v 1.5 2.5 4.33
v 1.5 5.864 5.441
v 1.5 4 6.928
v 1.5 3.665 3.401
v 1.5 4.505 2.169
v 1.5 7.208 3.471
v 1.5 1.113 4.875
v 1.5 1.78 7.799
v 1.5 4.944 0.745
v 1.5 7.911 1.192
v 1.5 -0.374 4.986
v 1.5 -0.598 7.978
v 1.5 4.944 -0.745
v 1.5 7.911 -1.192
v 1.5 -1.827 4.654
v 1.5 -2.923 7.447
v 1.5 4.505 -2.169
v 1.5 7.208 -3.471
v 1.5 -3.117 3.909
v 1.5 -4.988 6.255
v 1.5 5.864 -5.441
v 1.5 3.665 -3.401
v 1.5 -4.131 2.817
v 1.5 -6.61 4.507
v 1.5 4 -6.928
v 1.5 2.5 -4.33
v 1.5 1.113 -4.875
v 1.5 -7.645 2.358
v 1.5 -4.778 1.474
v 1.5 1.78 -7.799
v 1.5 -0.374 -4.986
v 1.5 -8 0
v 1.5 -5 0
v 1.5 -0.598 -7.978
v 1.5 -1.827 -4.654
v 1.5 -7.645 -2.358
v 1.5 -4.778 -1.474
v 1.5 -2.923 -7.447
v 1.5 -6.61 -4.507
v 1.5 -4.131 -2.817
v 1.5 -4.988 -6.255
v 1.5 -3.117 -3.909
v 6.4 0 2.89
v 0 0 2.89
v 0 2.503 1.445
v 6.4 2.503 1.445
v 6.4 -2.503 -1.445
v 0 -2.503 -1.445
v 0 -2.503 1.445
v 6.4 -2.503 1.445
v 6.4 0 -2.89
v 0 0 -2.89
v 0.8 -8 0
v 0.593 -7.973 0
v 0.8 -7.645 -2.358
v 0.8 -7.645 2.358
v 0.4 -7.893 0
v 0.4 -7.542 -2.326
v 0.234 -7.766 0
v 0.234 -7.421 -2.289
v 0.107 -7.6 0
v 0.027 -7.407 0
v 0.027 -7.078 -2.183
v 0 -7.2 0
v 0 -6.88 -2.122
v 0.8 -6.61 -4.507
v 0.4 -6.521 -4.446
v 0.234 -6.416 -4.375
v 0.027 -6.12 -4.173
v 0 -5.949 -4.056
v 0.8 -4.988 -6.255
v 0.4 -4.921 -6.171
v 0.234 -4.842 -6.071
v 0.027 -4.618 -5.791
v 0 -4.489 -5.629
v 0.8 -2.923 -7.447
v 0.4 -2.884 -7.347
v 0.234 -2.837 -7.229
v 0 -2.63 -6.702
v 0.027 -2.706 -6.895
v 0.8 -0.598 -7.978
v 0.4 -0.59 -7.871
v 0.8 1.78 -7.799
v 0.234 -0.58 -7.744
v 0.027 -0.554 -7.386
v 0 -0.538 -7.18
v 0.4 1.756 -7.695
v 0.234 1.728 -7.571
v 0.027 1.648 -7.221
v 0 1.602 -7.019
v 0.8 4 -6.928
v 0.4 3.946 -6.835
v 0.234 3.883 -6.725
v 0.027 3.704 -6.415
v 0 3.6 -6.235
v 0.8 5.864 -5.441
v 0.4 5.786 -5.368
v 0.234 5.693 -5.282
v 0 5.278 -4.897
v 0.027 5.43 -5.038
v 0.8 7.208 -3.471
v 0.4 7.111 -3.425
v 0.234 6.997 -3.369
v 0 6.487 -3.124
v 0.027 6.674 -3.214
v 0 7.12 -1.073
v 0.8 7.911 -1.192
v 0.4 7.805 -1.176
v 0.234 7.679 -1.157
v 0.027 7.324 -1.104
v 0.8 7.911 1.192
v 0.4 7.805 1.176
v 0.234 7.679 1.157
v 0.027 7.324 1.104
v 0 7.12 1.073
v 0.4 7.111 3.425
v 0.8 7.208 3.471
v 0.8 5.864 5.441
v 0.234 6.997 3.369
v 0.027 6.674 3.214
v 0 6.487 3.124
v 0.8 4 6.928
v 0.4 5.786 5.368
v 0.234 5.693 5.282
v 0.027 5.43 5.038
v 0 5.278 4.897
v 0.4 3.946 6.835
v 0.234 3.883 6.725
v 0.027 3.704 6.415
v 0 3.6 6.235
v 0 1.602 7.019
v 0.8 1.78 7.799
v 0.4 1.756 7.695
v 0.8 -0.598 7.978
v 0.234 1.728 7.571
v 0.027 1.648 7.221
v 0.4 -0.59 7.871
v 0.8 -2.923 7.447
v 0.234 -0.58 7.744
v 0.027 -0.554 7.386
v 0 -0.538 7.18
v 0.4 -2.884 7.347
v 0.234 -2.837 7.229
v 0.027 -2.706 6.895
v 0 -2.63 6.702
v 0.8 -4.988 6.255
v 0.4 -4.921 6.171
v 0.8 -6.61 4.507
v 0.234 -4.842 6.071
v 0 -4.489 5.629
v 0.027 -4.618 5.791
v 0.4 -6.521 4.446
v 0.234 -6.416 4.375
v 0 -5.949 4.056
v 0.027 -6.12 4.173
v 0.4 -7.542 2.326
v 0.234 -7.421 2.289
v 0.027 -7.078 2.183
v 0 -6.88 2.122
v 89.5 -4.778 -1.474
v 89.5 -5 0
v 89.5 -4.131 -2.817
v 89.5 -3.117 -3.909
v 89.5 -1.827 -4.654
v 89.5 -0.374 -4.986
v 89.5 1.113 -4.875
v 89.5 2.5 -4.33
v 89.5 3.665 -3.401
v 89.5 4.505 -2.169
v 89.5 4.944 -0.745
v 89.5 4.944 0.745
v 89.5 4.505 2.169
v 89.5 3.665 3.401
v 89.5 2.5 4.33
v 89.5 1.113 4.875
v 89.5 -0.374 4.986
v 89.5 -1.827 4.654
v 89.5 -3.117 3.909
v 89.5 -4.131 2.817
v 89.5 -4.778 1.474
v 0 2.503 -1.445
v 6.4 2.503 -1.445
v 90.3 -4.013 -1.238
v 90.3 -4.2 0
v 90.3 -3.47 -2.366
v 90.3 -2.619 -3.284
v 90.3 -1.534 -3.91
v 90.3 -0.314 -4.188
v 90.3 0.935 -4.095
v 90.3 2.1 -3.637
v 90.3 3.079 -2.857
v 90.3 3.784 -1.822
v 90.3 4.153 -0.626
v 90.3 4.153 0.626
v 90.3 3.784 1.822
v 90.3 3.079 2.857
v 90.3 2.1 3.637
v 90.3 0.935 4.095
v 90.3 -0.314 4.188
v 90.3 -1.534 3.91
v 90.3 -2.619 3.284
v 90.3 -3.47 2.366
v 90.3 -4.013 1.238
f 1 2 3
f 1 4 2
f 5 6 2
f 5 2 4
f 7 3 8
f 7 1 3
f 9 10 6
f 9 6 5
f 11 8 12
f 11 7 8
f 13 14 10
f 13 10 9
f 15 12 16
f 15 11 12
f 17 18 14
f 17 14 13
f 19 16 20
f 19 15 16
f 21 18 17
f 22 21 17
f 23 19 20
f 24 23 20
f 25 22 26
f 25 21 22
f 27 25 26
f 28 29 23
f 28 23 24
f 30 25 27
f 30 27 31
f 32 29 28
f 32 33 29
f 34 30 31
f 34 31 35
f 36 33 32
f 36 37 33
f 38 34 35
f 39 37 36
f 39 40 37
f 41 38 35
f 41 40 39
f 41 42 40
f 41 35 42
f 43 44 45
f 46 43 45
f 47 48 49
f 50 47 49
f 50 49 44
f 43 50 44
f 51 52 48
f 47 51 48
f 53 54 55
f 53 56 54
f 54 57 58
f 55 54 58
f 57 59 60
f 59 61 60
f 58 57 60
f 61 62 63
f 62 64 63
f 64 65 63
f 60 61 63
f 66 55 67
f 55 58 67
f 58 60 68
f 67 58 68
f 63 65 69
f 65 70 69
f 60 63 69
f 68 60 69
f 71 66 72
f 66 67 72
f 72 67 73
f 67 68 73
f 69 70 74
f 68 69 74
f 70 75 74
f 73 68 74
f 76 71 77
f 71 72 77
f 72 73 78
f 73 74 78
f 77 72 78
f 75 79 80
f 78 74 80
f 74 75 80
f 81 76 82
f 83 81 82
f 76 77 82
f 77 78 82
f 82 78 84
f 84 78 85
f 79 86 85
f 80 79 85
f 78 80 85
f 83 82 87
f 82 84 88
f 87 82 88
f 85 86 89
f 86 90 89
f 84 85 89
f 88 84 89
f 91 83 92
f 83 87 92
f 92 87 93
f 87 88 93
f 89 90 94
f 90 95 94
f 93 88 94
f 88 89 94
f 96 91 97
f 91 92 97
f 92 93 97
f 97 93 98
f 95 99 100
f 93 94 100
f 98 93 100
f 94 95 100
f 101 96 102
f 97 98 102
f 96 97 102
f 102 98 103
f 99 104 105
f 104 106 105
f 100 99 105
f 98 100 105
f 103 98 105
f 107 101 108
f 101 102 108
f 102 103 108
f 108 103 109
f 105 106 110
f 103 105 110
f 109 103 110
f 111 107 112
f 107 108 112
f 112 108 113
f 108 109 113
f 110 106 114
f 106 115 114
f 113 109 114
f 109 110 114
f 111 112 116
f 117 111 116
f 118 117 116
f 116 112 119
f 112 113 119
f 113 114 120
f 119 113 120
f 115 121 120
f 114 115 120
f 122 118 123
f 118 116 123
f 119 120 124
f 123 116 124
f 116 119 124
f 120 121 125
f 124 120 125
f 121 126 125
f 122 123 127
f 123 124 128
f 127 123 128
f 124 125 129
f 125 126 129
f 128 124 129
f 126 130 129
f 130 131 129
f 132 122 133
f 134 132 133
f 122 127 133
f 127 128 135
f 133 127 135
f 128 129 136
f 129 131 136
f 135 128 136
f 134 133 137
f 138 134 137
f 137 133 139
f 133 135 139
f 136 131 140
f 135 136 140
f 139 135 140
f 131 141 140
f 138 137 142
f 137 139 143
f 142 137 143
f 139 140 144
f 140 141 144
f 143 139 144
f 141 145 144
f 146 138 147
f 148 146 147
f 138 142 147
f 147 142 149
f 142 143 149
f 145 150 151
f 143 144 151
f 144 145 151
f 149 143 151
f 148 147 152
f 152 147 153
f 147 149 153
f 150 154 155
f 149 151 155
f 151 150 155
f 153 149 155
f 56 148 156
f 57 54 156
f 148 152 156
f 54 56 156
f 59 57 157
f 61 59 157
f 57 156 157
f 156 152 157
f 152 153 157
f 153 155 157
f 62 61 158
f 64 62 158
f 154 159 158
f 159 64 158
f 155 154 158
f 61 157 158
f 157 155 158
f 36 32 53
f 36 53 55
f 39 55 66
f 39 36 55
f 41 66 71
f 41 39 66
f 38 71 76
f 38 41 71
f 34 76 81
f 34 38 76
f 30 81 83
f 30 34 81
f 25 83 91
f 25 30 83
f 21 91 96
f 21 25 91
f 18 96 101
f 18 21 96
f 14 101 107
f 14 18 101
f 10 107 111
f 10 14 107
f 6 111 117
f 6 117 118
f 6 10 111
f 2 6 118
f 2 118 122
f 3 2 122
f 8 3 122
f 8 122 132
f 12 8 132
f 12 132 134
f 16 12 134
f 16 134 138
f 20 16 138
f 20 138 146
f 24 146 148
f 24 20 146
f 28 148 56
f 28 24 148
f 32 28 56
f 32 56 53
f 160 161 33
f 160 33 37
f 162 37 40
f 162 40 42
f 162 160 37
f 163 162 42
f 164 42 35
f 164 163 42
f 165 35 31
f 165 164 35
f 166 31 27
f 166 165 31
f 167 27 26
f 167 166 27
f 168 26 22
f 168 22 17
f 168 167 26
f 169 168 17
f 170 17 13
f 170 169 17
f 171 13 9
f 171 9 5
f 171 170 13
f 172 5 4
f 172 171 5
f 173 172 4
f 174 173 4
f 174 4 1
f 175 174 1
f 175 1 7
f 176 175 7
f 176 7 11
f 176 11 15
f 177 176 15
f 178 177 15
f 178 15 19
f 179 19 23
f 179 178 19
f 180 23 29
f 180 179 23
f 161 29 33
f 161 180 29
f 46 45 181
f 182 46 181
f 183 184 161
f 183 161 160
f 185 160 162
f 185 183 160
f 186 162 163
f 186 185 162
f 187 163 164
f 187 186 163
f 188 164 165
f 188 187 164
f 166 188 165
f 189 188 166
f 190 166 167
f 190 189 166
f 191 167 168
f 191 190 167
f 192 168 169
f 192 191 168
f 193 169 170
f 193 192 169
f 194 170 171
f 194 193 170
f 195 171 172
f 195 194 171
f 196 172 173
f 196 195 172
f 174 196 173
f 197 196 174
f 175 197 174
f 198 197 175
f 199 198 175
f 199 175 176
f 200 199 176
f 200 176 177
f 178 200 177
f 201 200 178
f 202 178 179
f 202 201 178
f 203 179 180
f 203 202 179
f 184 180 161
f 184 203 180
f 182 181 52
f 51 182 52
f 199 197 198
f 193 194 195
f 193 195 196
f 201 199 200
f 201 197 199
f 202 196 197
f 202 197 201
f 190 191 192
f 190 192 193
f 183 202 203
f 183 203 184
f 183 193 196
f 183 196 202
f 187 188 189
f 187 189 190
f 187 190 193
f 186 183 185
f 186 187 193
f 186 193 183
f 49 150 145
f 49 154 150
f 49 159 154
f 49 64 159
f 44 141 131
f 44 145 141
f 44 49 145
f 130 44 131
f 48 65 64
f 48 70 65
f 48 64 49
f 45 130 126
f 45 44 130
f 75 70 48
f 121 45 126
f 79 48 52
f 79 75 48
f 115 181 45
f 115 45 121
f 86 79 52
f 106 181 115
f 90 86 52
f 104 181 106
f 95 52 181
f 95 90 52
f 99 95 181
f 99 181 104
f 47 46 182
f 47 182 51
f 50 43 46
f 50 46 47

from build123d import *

# Parameters (mm, degrees)
F2_SIZE2 = 0.8
F2_SIZE  = 0.8
F3_R     = 0.8
F5_DEPTH = 6.4


with BuildPart() as f1:
    # F0 (on Top) → F1 (revolve)
    with BuildSketch(Plane.XY):
        Polygon((90.3, 0), (0, 0), (0, -8), (1.5, -8), (1.5, -5), (90.3, -5), align=None)
    revolve(axis=Axis((45.15, 0, 0), (1, 0, 0)))

    # F2
    f2_edges = [f1.edges().sort_by_distance(p)[0] for p in [
        (90.3, 5, 0),
    ]]
    chamfer(f2_edges, length=F2_SIZE, length2=F2_SIZE2)

    # F3
    f3_edges = [f1.edges().sort_by_distance(p)[0] for p in [
        (0, 8, 0),
    ]]
    fillet(f3_edges, radius=F3_R)

    # F4 (on face) → F5 (cut)
    with BuildSketch(Plane(origin=(0, 0, 0), x_dir=(0, -1, 0), z_dir=(-1, 0, 0))):
        Polygon((2.502813, -1.445), (2.502813, 1.445), (0, 2.89), (-2.502813, 1.445), (-2.502813, -1.445), (0, -2.89), align=None)
    extrude(amount=-F5_DEPTH, mode=Mode.SUBTRACT)


solid = f1.part
